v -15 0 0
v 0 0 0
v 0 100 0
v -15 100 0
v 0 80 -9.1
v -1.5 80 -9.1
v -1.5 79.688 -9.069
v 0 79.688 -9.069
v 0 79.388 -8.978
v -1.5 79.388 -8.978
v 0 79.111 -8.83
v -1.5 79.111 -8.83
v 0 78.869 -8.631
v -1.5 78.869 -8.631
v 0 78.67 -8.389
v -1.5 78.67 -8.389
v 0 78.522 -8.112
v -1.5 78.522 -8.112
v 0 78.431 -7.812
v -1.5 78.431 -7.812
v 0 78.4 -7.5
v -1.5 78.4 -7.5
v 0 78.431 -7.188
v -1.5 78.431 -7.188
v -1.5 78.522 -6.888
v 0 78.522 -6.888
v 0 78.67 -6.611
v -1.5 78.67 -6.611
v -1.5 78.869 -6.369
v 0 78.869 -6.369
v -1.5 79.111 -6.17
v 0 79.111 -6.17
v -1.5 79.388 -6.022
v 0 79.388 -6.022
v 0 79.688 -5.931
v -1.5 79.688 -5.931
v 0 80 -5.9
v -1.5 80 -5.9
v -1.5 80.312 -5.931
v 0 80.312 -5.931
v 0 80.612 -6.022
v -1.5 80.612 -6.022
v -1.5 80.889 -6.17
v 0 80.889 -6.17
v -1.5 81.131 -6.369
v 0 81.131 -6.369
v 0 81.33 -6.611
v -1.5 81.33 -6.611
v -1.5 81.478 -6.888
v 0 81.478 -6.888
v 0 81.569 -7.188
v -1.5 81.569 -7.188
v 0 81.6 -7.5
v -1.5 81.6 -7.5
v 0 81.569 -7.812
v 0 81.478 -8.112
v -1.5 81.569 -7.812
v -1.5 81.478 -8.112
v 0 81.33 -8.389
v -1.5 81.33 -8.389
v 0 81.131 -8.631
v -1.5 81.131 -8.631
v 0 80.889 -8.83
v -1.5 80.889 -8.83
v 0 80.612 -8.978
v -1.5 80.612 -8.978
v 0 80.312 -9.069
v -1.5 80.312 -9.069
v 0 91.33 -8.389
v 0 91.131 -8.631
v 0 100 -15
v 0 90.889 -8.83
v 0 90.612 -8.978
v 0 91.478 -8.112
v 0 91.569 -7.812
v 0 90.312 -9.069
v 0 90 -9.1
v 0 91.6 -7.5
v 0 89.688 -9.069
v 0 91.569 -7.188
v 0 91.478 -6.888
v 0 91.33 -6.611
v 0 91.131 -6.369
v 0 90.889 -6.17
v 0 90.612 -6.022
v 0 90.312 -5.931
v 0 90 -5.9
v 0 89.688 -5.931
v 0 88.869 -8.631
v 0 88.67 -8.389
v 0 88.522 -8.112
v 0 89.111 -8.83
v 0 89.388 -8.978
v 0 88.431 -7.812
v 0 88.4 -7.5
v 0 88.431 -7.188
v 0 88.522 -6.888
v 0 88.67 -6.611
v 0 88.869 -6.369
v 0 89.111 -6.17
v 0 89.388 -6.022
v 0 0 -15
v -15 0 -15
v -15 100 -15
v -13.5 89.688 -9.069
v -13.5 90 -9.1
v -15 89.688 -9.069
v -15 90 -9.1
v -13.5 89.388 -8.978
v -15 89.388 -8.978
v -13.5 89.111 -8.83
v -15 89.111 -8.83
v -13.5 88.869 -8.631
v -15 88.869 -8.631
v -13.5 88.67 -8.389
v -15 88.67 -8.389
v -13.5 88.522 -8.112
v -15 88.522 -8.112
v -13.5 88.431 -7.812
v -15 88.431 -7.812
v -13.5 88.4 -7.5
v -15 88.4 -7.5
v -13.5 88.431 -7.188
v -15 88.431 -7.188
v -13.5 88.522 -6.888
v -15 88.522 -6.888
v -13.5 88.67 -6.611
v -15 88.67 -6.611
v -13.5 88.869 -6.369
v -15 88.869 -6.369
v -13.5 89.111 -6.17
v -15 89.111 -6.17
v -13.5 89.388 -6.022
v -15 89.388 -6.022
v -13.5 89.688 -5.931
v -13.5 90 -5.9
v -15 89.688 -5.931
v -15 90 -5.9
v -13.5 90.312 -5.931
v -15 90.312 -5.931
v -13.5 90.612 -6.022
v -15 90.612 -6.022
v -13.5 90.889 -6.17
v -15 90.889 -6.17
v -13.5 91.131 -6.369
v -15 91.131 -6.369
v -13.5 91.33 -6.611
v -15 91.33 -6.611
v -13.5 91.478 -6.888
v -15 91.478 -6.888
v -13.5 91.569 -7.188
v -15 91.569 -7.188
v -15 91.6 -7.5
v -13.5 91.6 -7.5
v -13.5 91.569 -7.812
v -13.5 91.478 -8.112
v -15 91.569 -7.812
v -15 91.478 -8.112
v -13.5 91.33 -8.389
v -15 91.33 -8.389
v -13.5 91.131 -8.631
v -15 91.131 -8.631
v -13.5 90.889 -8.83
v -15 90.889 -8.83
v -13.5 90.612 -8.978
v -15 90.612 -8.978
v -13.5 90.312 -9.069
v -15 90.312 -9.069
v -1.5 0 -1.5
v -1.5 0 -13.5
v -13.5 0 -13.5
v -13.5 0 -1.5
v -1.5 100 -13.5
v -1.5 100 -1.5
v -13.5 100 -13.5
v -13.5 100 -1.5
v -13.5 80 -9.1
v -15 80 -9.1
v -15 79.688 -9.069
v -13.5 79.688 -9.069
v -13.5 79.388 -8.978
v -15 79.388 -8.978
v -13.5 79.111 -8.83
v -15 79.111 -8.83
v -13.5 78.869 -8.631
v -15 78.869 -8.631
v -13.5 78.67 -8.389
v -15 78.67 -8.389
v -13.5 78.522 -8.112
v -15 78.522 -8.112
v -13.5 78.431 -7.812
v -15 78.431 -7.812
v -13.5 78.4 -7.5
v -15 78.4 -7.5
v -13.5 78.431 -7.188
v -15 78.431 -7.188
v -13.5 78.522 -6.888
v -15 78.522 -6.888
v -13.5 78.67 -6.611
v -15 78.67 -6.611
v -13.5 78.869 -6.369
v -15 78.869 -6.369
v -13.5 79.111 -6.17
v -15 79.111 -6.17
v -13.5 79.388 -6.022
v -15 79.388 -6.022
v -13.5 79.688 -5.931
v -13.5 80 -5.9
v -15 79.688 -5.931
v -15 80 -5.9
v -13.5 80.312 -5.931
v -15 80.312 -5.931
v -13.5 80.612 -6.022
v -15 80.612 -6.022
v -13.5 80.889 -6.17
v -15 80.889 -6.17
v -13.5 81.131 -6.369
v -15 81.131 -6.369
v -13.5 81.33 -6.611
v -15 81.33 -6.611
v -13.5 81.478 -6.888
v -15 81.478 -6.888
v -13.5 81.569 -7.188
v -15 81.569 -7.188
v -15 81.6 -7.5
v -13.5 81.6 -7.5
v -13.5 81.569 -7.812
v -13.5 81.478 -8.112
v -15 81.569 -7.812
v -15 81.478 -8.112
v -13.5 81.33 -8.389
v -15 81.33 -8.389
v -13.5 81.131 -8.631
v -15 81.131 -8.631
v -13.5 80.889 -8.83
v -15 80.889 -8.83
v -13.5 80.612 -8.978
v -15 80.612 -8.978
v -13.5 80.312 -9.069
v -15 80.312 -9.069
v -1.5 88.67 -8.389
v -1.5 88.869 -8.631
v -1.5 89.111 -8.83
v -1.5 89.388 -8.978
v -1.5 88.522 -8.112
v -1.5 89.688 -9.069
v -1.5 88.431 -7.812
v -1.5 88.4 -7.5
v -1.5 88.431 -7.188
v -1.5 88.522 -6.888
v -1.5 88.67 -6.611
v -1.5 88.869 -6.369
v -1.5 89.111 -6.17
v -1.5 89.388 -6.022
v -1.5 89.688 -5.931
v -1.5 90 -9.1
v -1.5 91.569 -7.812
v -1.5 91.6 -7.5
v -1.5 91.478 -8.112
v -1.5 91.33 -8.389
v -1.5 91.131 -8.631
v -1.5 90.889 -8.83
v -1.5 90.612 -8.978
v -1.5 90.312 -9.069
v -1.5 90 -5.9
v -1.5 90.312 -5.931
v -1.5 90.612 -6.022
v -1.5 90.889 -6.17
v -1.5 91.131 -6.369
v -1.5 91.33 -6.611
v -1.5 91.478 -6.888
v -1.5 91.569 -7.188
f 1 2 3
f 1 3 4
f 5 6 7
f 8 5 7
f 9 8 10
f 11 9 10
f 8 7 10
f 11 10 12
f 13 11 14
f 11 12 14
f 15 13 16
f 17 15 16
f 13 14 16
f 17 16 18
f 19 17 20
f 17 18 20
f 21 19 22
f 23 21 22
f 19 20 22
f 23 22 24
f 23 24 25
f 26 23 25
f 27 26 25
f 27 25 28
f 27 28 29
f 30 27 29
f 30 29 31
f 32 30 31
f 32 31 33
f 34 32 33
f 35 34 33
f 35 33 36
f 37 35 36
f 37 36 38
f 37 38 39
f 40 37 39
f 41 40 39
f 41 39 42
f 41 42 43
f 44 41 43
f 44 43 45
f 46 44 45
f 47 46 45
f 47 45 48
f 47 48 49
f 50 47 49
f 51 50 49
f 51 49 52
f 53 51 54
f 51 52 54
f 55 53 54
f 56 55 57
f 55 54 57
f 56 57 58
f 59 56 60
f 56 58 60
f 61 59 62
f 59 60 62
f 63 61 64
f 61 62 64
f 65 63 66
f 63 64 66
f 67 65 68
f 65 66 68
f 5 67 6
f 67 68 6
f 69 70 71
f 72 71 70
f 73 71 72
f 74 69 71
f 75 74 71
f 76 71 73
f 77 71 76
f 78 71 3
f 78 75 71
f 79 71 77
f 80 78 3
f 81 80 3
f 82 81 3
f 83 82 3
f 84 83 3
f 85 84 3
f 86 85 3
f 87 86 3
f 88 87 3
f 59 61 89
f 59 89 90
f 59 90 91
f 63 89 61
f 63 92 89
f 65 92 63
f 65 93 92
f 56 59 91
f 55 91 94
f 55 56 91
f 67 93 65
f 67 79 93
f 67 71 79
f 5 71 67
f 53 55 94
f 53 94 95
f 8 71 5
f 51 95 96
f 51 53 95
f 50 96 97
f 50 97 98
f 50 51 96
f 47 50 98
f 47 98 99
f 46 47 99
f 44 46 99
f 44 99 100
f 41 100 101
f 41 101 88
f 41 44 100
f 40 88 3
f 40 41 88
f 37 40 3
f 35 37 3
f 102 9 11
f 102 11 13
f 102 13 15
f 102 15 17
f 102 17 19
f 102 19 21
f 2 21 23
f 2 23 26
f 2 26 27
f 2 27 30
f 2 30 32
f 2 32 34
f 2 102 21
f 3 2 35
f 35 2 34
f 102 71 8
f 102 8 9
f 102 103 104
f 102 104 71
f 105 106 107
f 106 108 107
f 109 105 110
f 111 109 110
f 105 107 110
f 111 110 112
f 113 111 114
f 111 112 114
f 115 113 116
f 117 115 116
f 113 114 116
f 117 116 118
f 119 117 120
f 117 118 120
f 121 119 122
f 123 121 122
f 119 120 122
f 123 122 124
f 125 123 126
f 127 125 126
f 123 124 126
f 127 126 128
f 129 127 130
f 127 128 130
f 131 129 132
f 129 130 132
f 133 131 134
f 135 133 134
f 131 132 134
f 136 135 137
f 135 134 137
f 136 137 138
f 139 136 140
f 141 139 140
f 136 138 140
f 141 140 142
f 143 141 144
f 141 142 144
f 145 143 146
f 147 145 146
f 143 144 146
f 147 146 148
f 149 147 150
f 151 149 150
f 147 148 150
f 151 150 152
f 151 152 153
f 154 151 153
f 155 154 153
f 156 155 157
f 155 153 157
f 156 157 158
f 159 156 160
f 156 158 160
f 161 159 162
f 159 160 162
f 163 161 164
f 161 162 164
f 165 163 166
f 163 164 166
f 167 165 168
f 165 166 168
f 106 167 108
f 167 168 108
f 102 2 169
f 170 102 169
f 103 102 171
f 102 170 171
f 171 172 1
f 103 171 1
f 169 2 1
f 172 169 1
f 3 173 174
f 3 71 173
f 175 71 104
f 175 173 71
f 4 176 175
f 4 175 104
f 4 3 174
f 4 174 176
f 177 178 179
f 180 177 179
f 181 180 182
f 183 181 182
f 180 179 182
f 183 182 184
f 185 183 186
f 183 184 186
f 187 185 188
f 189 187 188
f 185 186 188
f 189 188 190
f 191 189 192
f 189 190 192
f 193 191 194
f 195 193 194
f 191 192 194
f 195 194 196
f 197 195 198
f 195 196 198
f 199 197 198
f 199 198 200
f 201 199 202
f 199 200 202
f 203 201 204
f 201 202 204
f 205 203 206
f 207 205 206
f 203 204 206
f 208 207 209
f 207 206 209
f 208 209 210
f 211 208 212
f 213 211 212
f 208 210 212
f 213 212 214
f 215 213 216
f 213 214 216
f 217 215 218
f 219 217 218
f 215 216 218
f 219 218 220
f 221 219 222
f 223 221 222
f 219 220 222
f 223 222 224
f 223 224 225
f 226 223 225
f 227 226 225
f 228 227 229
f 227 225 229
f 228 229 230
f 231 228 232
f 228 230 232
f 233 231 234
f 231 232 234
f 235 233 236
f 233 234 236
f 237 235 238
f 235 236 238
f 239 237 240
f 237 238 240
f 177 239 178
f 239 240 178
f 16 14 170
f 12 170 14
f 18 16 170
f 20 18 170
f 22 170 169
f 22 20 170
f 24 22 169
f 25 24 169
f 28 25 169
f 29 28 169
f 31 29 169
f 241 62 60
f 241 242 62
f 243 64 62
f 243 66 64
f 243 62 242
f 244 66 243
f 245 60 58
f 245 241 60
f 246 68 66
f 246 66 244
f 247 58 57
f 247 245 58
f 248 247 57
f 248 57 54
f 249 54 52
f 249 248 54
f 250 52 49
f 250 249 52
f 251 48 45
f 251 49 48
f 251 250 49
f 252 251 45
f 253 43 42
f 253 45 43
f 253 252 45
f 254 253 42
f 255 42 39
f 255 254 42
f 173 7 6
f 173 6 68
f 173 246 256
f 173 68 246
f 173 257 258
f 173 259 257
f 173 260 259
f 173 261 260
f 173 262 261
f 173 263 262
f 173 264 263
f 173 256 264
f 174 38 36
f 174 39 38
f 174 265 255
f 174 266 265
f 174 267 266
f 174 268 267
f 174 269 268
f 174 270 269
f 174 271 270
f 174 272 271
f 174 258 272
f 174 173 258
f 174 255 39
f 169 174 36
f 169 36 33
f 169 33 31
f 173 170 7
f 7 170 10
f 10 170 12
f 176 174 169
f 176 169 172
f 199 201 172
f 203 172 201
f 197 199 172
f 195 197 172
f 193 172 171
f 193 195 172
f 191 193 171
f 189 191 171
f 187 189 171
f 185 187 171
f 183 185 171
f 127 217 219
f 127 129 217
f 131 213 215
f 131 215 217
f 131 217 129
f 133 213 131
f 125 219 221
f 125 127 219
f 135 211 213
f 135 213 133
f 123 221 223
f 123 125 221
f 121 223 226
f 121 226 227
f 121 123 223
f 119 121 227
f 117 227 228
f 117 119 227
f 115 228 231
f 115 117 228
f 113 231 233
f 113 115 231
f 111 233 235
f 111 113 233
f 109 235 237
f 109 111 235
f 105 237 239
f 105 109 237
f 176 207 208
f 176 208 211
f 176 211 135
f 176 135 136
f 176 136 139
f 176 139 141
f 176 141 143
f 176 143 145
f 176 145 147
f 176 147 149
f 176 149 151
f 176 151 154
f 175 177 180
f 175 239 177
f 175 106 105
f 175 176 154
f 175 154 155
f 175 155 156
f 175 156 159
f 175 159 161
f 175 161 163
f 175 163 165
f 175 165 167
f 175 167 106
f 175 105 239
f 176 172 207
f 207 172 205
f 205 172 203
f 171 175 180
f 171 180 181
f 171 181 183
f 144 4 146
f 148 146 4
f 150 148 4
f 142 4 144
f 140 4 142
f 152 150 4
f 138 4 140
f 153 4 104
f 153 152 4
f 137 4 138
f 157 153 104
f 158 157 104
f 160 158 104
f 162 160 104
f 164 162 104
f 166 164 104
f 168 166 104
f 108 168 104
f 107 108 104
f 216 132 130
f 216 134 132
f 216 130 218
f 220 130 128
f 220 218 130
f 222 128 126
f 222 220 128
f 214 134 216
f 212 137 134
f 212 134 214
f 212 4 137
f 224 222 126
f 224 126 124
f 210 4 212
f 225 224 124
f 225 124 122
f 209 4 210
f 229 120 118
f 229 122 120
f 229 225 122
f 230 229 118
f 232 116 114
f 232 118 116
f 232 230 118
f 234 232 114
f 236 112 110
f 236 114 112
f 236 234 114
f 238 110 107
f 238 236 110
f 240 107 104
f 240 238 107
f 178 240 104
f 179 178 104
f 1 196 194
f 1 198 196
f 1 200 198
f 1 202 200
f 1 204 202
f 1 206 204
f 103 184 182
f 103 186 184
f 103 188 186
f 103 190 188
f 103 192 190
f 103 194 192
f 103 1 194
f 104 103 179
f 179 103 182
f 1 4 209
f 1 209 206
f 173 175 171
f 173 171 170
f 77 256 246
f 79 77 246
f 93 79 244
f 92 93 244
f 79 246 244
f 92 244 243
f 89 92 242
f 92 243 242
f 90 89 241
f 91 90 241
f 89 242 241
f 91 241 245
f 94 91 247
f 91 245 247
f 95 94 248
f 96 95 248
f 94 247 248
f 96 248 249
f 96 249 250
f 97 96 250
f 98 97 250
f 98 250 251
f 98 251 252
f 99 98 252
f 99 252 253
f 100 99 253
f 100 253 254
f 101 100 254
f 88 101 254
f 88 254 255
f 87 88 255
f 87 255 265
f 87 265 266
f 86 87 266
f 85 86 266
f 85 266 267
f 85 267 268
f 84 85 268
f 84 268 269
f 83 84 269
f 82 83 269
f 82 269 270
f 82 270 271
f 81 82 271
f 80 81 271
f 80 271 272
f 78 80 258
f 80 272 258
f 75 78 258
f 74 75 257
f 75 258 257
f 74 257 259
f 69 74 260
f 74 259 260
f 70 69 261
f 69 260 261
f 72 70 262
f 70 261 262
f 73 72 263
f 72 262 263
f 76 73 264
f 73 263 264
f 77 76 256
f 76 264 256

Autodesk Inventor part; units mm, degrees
ref_plane "YZ Plane" through (0, 0, 0) normal (1, 0, 0) x (0, 1, 0)
ref_plane "XZ Plane" through (0, 0, 0) normal (0, 1, 0) x (-1, 0, 0)
ref_plane "XY Plane" through (0, 0, 0) normal (0, 0, 1) x (1, 0, 0)
sketch "スケッチ1" plane through (0, 0, 0) normal (0, 1, 0) x (-1, 0, 0)
  line L0 (0, 0) -> (15, 0)
  line L1 (15, 0) -> (15, -15)
  line L2 (15, -15) -> (0, -15)
  line L3 (0, -15) -> (0, 0)
  dimension "d0" = 15
  dimension "d1" = 15
extrude "押し出し1" add sketch "スケッチ1" along normal blind 100
sketch "スケッチ2" plane through (0, 100, 0) normal (0, 1, 0) x (1, 0, 0)
  line L0 (-13.5, 13.5) -> (-1.5, 13.5)
  line L1 (-1.5, 13.5) -> (-1.5, 1.5)
  line L2 (-1.5, 1.5) -> (-13.5, 1.5)
  line L3 (-13.5, 1.5) -> (-13.5, 13.5)
  line L4 (-15, 15) -> (-15, 0) projected
  line L5 (0, 15) -> (-15, 15) projected
  point P0 (0, 0)
  dimension "d4" = 12
  dimension "d5" = 12
  dimension "d6" = 1.5
  dimension "d7" = 1.5
extrude "押し出し2" cut sketch "スケッチ2" against normal blind 100
sketch "スケッチ3" plane through (0, 0, 0) normal (1, 0, 0) x (0, 0, -1)
  point P0 (0, 0)
sketch "スケッチ4" plane through (0, 0, 0) normal (1, 0, 0) x (0, 0, -1)
  line L0 (0, 100) -> (15, 100) projected
  line L1 (0, 0) -> (0, 100) projected
  point P0 (7.5, 90)
  point P1 (7.5, 80)
  dimension "d10" = 10
  dimension "d11" = 7.5
  dimension "d12" = 10
  dimension "d13" = 7.5
hole "穴1" at (0, 90, -7.5) at (0, 80, -7.5) direction (-1, 0, 0) diameter 3.2 end through all
